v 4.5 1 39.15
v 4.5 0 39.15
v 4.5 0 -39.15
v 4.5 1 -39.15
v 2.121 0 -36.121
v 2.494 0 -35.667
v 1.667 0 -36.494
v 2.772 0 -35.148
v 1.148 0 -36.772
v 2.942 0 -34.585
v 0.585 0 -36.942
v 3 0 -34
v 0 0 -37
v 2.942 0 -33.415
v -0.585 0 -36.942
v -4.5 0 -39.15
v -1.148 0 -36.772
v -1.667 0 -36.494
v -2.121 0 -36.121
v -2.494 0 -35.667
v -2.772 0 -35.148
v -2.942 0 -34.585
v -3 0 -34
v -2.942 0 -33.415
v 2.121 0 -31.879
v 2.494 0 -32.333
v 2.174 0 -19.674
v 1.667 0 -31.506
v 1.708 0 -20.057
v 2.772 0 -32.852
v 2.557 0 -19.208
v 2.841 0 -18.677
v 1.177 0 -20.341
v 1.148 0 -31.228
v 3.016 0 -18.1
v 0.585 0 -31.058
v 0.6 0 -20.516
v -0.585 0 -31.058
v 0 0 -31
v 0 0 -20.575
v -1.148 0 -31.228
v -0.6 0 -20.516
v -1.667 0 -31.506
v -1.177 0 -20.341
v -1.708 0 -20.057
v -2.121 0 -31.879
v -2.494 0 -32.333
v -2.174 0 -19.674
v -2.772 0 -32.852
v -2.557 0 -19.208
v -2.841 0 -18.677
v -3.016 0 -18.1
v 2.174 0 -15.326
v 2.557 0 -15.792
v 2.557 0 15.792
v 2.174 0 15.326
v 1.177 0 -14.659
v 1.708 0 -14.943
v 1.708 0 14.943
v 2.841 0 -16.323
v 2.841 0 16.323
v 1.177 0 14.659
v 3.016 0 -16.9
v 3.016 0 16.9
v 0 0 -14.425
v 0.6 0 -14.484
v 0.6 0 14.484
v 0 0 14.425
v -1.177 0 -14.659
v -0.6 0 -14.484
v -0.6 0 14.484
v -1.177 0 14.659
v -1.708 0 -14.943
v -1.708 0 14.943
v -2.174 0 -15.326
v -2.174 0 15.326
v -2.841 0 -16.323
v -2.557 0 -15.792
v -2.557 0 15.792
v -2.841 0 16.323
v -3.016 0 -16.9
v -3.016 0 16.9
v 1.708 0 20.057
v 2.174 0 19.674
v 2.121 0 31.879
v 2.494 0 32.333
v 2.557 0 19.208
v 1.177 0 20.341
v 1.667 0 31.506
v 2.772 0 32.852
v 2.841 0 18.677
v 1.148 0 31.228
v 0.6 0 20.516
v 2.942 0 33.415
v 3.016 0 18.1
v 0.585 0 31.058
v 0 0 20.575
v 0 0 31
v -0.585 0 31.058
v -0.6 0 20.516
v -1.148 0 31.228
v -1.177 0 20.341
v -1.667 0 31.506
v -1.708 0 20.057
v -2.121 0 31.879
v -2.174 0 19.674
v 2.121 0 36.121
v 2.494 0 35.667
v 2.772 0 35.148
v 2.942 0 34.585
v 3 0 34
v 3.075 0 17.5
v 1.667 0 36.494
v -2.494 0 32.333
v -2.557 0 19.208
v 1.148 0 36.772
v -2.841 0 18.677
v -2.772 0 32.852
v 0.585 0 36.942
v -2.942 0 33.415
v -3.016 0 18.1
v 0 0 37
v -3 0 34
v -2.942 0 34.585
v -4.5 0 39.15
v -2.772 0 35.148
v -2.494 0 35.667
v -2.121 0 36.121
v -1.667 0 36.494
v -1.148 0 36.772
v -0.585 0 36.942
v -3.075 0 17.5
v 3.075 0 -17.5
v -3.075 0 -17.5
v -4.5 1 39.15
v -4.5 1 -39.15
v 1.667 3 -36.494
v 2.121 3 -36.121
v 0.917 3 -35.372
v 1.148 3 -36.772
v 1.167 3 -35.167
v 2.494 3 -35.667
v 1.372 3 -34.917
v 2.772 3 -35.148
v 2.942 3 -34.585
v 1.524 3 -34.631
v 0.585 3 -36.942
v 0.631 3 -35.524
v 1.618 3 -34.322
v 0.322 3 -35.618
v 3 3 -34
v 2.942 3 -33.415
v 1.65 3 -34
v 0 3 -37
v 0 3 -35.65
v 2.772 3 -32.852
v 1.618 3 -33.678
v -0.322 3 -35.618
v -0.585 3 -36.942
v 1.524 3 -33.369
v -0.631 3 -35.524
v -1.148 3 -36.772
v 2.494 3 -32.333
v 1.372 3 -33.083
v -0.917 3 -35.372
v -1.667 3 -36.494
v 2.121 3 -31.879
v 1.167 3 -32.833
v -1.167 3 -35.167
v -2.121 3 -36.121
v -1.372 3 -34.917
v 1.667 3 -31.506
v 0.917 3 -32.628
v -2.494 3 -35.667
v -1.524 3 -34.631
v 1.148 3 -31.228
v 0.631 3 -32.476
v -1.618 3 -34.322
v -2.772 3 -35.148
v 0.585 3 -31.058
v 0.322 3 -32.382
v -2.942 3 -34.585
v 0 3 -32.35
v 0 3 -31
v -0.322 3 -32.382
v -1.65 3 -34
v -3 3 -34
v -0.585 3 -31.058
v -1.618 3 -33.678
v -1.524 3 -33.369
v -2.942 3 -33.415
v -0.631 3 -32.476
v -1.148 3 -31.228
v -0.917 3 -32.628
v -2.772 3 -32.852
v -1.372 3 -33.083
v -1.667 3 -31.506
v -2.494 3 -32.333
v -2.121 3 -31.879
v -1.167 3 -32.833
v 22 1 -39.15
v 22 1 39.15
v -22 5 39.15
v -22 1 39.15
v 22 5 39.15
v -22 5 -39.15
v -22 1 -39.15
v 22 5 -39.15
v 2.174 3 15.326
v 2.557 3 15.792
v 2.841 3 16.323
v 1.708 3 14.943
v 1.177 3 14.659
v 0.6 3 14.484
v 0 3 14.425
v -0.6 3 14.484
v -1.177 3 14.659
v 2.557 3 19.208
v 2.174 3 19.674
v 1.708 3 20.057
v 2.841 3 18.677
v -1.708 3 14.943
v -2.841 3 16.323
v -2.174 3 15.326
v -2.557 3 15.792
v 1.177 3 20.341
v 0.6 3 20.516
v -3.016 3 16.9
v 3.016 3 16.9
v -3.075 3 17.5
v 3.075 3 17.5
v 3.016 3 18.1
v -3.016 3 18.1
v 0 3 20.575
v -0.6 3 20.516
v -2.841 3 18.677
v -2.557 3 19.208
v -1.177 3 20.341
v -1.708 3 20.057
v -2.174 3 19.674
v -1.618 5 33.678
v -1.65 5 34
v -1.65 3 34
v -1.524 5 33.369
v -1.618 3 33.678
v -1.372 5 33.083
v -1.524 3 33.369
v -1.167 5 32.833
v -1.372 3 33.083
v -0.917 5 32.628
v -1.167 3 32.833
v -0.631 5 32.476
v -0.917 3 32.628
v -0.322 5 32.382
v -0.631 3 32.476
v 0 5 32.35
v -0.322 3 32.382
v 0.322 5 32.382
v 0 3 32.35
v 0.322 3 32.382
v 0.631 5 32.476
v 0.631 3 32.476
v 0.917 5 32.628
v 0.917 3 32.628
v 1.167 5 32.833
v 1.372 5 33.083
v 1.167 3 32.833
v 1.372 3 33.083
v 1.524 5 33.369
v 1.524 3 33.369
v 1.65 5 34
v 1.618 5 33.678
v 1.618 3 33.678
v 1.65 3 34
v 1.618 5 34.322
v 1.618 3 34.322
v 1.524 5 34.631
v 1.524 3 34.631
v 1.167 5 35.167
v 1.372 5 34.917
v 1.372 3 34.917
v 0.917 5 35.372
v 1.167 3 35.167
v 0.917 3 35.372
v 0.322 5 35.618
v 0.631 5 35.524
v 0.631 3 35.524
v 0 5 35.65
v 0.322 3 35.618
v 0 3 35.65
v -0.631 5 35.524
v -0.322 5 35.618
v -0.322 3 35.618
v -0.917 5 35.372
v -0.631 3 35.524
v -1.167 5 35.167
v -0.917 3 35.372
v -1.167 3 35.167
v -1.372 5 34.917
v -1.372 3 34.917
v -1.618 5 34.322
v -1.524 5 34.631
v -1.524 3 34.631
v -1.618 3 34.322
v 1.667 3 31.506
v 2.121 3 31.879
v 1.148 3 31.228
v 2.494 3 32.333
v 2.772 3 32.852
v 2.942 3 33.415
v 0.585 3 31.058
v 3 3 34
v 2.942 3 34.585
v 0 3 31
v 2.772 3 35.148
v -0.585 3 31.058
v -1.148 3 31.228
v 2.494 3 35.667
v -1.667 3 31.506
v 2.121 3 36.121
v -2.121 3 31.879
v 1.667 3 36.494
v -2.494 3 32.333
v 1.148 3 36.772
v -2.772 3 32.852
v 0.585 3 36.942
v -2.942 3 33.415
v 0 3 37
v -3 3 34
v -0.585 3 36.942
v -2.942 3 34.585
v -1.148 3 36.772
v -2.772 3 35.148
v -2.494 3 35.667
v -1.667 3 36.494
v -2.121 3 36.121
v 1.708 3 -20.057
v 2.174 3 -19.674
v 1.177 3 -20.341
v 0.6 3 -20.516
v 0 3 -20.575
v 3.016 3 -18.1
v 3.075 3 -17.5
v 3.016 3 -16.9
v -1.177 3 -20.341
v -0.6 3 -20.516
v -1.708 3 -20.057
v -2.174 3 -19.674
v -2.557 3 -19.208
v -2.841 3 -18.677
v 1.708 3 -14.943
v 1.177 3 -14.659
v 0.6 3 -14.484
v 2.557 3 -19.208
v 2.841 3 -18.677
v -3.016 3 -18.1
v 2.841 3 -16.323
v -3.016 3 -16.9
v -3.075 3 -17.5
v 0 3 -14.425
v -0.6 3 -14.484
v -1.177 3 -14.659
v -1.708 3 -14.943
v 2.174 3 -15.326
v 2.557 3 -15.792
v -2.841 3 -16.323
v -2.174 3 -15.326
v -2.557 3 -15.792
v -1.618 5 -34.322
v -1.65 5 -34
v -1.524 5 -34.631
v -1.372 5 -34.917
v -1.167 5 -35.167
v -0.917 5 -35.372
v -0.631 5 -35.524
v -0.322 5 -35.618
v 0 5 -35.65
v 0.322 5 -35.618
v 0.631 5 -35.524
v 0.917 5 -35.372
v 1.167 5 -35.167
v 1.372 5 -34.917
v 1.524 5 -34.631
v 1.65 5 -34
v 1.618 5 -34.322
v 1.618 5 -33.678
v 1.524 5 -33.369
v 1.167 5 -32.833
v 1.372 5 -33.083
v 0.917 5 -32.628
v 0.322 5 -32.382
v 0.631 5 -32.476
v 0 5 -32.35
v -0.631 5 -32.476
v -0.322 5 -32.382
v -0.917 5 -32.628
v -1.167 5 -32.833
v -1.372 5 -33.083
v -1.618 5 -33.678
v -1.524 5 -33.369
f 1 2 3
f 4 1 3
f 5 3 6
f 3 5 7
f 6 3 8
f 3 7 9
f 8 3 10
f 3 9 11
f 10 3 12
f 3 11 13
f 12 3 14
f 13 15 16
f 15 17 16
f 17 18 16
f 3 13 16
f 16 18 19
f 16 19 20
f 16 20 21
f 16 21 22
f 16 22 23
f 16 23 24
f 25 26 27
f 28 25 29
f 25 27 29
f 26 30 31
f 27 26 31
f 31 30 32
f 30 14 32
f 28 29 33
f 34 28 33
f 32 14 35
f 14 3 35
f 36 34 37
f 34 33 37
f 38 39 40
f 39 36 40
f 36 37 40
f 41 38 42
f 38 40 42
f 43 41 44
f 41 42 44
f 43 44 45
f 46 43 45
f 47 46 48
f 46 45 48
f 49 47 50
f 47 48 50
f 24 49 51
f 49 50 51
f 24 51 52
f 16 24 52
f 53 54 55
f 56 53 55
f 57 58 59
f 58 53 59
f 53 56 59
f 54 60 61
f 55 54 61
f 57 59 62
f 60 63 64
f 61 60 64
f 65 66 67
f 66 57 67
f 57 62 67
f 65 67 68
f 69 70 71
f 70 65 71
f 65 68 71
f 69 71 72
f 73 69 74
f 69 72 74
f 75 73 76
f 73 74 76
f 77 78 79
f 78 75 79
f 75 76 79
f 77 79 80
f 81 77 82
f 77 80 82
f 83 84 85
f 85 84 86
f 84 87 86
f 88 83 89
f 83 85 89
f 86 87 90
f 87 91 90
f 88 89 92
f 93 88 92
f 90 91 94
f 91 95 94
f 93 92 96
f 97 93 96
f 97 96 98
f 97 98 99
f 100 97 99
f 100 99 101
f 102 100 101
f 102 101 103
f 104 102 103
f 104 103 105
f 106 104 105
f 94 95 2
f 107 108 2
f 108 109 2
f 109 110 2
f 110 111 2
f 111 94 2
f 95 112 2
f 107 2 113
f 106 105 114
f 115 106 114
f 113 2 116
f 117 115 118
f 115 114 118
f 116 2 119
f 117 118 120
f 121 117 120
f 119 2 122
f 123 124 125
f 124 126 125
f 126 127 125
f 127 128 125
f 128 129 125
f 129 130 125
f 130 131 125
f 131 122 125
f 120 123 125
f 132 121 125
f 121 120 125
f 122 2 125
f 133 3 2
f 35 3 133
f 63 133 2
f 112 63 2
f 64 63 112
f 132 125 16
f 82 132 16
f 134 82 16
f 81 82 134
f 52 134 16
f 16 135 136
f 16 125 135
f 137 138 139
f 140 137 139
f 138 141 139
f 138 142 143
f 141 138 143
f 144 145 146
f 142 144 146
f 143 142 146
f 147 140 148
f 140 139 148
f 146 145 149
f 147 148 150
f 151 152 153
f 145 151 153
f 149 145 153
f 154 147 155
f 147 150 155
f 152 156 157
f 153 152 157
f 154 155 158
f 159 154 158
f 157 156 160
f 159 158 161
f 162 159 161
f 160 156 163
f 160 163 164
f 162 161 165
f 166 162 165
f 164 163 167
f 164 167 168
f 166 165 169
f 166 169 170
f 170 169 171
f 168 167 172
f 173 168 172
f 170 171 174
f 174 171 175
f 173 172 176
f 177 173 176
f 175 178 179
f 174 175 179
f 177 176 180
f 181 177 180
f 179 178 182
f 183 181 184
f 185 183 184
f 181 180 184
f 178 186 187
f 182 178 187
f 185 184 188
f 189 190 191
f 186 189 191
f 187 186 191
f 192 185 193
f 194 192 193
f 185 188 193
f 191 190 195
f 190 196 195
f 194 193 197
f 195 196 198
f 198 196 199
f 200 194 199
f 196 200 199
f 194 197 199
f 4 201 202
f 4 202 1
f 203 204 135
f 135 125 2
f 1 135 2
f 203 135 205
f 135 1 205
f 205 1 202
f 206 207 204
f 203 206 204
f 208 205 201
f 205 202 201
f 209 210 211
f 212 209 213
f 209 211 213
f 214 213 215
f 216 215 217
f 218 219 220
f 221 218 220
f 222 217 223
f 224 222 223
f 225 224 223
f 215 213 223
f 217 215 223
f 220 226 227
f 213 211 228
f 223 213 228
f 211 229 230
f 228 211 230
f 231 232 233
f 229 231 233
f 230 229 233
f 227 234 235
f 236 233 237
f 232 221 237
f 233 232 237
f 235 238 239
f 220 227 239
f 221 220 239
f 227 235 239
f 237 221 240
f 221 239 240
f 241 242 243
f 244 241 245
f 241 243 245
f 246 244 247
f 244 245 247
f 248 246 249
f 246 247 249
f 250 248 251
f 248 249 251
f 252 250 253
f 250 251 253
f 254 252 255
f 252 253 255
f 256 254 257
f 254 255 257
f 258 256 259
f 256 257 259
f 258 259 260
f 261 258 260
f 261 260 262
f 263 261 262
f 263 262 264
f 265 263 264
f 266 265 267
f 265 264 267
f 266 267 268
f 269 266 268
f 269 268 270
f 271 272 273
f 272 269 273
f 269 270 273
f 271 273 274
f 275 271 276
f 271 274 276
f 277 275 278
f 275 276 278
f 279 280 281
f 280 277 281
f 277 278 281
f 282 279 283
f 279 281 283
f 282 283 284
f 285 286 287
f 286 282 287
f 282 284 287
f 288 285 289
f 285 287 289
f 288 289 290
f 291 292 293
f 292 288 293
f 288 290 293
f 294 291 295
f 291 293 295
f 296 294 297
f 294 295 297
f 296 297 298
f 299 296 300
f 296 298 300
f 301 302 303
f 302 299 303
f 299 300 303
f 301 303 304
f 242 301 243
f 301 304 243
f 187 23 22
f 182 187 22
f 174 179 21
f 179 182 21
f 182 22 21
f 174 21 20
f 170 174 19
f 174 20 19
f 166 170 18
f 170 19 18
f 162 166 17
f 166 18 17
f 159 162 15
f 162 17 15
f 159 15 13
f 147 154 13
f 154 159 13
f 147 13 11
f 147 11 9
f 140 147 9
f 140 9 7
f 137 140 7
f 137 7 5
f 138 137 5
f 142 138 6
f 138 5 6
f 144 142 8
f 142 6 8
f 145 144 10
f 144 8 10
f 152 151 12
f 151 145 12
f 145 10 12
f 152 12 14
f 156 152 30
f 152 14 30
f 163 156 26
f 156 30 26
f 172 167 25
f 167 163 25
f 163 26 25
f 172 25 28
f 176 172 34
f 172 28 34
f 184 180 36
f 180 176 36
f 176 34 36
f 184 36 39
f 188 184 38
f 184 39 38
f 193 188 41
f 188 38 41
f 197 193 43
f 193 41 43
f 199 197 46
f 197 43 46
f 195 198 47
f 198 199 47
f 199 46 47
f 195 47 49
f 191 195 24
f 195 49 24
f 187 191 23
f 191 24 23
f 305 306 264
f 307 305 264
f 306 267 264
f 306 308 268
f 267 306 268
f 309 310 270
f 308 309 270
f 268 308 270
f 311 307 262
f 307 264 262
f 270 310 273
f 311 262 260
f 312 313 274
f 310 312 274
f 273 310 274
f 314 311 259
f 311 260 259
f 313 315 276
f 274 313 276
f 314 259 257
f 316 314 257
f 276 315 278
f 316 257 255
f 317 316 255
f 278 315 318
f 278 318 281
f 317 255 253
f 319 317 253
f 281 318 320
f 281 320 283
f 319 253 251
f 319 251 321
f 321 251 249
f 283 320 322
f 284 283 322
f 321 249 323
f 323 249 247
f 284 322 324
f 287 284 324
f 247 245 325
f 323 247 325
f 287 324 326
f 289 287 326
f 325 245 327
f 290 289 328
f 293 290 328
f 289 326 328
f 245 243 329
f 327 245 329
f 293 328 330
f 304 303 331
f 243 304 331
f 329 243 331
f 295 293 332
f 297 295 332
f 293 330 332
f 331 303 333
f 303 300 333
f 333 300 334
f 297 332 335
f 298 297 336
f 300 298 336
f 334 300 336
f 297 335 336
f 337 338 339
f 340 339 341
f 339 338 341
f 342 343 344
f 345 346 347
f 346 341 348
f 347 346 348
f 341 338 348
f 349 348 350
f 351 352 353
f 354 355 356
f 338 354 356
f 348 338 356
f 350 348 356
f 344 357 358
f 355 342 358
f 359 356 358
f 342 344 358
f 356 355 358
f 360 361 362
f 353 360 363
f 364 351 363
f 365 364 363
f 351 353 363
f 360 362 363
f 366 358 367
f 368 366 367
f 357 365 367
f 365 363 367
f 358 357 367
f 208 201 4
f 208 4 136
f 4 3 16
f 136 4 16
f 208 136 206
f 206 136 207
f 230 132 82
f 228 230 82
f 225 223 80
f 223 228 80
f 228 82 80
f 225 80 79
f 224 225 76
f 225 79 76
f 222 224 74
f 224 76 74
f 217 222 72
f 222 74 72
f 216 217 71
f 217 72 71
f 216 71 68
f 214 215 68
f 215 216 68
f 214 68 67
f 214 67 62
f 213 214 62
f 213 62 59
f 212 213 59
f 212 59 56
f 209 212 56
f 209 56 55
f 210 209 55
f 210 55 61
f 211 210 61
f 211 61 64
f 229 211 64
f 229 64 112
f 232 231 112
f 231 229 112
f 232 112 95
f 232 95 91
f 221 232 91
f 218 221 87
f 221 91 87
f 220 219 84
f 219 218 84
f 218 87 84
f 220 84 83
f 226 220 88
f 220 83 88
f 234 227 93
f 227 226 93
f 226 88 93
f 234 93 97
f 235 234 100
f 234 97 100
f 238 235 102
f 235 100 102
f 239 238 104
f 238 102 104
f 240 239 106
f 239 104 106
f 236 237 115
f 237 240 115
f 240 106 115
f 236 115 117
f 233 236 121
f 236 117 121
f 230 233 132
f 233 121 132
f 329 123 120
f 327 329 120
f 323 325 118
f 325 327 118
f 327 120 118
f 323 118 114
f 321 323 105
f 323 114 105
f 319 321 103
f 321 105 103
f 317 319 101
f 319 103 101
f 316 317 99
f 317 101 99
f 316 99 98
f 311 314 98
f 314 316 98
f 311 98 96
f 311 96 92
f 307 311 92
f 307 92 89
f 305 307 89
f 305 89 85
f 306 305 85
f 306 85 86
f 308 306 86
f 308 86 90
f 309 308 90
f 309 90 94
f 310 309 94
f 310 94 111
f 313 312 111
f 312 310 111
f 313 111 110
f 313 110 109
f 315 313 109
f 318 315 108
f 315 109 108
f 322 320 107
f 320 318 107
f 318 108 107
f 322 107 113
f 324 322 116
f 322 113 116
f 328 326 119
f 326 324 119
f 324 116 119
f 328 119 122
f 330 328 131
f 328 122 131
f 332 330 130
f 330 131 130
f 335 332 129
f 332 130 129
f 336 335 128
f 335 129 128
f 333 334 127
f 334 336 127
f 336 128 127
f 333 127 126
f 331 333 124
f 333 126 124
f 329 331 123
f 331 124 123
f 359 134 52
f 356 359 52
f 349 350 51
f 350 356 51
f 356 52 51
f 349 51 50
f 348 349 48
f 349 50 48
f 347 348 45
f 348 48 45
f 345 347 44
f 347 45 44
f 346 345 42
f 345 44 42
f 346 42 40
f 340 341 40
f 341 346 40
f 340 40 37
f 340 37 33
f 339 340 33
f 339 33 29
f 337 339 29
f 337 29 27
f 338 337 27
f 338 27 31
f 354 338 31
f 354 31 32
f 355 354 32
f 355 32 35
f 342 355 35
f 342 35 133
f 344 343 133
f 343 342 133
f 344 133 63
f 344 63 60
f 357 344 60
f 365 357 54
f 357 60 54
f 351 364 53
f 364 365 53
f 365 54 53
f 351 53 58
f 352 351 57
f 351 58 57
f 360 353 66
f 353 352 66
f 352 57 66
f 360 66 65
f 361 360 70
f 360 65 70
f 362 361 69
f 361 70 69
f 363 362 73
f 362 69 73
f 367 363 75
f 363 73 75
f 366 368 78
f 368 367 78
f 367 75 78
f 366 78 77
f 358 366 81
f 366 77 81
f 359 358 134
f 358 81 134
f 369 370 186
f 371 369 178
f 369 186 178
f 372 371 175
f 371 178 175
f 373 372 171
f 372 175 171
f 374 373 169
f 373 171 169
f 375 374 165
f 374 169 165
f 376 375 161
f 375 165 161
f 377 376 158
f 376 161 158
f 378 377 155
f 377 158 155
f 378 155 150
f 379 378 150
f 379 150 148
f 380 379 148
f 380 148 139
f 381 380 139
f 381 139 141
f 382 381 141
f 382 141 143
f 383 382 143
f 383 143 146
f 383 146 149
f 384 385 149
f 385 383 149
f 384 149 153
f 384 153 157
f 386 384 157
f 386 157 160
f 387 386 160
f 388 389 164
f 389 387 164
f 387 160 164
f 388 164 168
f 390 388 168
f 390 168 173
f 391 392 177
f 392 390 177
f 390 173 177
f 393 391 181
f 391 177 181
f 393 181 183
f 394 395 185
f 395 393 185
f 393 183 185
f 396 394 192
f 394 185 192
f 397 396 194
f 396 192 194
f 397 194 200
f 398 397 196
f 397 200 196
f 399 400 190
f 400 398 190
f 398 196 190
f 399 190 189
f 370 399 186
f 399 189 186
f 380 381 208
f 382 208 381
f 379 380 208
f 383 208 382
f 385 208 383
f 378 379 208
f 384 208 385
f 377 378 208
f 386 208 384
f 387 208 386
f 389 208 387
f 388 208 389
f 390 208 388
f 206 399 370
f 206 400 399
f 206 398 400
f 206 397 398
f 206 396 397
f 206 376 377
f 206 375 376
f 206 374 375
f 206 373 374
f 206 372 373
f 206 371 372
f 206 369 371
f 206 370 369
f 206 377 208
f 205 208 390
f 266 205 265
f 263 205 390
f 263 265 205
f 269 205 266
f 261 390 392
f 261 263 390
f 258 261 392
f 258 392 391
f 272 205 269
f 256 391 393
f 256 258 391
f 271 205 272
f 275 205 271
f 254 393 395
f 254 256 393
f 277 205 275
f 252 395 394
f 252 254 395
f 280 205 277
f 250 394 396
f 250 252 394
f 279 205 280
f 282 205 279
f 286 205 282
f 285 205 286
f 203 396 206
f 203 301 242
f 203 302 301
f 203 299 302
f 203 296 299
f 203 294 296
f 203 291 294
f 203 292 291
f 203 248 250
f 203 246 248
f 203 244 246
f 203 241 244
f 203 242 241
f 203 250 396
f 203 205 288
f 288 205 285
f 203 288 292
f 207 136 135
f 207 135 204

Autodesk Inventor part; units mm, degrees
ref_plane "YZ Plane" through (0, 0, 0) normal (1, 0, 0) x (0, 1, 0)
ref_plane "XZ Plane" through (0, 0, 0) normal (0, 1, 0) x (-1, 0, 0)
ref_plane "XY Plane" through (0, 0, 0) normal (0, 0, 1) x (1, 0, 0)
sketch "スケッチ1" plane through (0, 0, 0) normal (0, 1, 0) x (-1, 0, 0)
  line L0 (22, 39.15) -> (-22, 39.15)
  line L1 (-22, 39.15) -> (-22, -39.15)
  line L2 (-22, -39.15) -> (22, -39.15)
  line L3 (22, -39.15) -> (22, 39.15)
  line L4 (22, 39.15) -> (-22, -39.15) construction
  line L5 (-22, 39.15) -> (22, -39.15) construction
  line L6 (0, -54.81) -> (0, 54.81) construction
  line L7 (30.8, 0) -> (-30.8, 0) construction
  circle A0 centre (0, 34) radius 1.65
  circle A1 centre (0, -34) radius 1.65
  circle A2 centre (0, 17.5) radius 3.075
  circle A3 centre (0, -17.5) radius 3.075
  circle A4 centre (0, 34) radius 3
  circle A5 centre (0, -34) radius 3
  line L8 (-4.5, 39.15) -> (-4.5, -39.15)
  line L9 (4.5, 39.15) -> (4.5, -39.15)
  point P0 (0, 0)
  dimension "d0" = 3.3
  dimension "d2" = 44
  dimension "d3" = 78.3
  dimension "d4" = 68
  dimension "d7" = 6.15
  dimension "d8" = 35
  dimension "d9" = 6
  dimension "d14" = 17.5
extrude "押し出し1" add sketch "スケッチ1" along normal blind 5 contours L3 L2 L9 L0 | L9 L2 L8 L0 | L8 L2 L1 L0 | A2 | A3 | A4 | A5
extrude "押し出し2" cut sketch "スケッチ1" along normal blind 3 contours A2 | A3
extrude "押し出し3" cut sketch "スケッチ1" along normal blind 3 contours A0 | A1 | A4 | A5
extrude "押し出し4" cut sketch "スケッチ1" along normal blind 1 contours L3 L2 L9 L0 | L8 L2 L1 L0
properties part number "plathomeusbhub"
